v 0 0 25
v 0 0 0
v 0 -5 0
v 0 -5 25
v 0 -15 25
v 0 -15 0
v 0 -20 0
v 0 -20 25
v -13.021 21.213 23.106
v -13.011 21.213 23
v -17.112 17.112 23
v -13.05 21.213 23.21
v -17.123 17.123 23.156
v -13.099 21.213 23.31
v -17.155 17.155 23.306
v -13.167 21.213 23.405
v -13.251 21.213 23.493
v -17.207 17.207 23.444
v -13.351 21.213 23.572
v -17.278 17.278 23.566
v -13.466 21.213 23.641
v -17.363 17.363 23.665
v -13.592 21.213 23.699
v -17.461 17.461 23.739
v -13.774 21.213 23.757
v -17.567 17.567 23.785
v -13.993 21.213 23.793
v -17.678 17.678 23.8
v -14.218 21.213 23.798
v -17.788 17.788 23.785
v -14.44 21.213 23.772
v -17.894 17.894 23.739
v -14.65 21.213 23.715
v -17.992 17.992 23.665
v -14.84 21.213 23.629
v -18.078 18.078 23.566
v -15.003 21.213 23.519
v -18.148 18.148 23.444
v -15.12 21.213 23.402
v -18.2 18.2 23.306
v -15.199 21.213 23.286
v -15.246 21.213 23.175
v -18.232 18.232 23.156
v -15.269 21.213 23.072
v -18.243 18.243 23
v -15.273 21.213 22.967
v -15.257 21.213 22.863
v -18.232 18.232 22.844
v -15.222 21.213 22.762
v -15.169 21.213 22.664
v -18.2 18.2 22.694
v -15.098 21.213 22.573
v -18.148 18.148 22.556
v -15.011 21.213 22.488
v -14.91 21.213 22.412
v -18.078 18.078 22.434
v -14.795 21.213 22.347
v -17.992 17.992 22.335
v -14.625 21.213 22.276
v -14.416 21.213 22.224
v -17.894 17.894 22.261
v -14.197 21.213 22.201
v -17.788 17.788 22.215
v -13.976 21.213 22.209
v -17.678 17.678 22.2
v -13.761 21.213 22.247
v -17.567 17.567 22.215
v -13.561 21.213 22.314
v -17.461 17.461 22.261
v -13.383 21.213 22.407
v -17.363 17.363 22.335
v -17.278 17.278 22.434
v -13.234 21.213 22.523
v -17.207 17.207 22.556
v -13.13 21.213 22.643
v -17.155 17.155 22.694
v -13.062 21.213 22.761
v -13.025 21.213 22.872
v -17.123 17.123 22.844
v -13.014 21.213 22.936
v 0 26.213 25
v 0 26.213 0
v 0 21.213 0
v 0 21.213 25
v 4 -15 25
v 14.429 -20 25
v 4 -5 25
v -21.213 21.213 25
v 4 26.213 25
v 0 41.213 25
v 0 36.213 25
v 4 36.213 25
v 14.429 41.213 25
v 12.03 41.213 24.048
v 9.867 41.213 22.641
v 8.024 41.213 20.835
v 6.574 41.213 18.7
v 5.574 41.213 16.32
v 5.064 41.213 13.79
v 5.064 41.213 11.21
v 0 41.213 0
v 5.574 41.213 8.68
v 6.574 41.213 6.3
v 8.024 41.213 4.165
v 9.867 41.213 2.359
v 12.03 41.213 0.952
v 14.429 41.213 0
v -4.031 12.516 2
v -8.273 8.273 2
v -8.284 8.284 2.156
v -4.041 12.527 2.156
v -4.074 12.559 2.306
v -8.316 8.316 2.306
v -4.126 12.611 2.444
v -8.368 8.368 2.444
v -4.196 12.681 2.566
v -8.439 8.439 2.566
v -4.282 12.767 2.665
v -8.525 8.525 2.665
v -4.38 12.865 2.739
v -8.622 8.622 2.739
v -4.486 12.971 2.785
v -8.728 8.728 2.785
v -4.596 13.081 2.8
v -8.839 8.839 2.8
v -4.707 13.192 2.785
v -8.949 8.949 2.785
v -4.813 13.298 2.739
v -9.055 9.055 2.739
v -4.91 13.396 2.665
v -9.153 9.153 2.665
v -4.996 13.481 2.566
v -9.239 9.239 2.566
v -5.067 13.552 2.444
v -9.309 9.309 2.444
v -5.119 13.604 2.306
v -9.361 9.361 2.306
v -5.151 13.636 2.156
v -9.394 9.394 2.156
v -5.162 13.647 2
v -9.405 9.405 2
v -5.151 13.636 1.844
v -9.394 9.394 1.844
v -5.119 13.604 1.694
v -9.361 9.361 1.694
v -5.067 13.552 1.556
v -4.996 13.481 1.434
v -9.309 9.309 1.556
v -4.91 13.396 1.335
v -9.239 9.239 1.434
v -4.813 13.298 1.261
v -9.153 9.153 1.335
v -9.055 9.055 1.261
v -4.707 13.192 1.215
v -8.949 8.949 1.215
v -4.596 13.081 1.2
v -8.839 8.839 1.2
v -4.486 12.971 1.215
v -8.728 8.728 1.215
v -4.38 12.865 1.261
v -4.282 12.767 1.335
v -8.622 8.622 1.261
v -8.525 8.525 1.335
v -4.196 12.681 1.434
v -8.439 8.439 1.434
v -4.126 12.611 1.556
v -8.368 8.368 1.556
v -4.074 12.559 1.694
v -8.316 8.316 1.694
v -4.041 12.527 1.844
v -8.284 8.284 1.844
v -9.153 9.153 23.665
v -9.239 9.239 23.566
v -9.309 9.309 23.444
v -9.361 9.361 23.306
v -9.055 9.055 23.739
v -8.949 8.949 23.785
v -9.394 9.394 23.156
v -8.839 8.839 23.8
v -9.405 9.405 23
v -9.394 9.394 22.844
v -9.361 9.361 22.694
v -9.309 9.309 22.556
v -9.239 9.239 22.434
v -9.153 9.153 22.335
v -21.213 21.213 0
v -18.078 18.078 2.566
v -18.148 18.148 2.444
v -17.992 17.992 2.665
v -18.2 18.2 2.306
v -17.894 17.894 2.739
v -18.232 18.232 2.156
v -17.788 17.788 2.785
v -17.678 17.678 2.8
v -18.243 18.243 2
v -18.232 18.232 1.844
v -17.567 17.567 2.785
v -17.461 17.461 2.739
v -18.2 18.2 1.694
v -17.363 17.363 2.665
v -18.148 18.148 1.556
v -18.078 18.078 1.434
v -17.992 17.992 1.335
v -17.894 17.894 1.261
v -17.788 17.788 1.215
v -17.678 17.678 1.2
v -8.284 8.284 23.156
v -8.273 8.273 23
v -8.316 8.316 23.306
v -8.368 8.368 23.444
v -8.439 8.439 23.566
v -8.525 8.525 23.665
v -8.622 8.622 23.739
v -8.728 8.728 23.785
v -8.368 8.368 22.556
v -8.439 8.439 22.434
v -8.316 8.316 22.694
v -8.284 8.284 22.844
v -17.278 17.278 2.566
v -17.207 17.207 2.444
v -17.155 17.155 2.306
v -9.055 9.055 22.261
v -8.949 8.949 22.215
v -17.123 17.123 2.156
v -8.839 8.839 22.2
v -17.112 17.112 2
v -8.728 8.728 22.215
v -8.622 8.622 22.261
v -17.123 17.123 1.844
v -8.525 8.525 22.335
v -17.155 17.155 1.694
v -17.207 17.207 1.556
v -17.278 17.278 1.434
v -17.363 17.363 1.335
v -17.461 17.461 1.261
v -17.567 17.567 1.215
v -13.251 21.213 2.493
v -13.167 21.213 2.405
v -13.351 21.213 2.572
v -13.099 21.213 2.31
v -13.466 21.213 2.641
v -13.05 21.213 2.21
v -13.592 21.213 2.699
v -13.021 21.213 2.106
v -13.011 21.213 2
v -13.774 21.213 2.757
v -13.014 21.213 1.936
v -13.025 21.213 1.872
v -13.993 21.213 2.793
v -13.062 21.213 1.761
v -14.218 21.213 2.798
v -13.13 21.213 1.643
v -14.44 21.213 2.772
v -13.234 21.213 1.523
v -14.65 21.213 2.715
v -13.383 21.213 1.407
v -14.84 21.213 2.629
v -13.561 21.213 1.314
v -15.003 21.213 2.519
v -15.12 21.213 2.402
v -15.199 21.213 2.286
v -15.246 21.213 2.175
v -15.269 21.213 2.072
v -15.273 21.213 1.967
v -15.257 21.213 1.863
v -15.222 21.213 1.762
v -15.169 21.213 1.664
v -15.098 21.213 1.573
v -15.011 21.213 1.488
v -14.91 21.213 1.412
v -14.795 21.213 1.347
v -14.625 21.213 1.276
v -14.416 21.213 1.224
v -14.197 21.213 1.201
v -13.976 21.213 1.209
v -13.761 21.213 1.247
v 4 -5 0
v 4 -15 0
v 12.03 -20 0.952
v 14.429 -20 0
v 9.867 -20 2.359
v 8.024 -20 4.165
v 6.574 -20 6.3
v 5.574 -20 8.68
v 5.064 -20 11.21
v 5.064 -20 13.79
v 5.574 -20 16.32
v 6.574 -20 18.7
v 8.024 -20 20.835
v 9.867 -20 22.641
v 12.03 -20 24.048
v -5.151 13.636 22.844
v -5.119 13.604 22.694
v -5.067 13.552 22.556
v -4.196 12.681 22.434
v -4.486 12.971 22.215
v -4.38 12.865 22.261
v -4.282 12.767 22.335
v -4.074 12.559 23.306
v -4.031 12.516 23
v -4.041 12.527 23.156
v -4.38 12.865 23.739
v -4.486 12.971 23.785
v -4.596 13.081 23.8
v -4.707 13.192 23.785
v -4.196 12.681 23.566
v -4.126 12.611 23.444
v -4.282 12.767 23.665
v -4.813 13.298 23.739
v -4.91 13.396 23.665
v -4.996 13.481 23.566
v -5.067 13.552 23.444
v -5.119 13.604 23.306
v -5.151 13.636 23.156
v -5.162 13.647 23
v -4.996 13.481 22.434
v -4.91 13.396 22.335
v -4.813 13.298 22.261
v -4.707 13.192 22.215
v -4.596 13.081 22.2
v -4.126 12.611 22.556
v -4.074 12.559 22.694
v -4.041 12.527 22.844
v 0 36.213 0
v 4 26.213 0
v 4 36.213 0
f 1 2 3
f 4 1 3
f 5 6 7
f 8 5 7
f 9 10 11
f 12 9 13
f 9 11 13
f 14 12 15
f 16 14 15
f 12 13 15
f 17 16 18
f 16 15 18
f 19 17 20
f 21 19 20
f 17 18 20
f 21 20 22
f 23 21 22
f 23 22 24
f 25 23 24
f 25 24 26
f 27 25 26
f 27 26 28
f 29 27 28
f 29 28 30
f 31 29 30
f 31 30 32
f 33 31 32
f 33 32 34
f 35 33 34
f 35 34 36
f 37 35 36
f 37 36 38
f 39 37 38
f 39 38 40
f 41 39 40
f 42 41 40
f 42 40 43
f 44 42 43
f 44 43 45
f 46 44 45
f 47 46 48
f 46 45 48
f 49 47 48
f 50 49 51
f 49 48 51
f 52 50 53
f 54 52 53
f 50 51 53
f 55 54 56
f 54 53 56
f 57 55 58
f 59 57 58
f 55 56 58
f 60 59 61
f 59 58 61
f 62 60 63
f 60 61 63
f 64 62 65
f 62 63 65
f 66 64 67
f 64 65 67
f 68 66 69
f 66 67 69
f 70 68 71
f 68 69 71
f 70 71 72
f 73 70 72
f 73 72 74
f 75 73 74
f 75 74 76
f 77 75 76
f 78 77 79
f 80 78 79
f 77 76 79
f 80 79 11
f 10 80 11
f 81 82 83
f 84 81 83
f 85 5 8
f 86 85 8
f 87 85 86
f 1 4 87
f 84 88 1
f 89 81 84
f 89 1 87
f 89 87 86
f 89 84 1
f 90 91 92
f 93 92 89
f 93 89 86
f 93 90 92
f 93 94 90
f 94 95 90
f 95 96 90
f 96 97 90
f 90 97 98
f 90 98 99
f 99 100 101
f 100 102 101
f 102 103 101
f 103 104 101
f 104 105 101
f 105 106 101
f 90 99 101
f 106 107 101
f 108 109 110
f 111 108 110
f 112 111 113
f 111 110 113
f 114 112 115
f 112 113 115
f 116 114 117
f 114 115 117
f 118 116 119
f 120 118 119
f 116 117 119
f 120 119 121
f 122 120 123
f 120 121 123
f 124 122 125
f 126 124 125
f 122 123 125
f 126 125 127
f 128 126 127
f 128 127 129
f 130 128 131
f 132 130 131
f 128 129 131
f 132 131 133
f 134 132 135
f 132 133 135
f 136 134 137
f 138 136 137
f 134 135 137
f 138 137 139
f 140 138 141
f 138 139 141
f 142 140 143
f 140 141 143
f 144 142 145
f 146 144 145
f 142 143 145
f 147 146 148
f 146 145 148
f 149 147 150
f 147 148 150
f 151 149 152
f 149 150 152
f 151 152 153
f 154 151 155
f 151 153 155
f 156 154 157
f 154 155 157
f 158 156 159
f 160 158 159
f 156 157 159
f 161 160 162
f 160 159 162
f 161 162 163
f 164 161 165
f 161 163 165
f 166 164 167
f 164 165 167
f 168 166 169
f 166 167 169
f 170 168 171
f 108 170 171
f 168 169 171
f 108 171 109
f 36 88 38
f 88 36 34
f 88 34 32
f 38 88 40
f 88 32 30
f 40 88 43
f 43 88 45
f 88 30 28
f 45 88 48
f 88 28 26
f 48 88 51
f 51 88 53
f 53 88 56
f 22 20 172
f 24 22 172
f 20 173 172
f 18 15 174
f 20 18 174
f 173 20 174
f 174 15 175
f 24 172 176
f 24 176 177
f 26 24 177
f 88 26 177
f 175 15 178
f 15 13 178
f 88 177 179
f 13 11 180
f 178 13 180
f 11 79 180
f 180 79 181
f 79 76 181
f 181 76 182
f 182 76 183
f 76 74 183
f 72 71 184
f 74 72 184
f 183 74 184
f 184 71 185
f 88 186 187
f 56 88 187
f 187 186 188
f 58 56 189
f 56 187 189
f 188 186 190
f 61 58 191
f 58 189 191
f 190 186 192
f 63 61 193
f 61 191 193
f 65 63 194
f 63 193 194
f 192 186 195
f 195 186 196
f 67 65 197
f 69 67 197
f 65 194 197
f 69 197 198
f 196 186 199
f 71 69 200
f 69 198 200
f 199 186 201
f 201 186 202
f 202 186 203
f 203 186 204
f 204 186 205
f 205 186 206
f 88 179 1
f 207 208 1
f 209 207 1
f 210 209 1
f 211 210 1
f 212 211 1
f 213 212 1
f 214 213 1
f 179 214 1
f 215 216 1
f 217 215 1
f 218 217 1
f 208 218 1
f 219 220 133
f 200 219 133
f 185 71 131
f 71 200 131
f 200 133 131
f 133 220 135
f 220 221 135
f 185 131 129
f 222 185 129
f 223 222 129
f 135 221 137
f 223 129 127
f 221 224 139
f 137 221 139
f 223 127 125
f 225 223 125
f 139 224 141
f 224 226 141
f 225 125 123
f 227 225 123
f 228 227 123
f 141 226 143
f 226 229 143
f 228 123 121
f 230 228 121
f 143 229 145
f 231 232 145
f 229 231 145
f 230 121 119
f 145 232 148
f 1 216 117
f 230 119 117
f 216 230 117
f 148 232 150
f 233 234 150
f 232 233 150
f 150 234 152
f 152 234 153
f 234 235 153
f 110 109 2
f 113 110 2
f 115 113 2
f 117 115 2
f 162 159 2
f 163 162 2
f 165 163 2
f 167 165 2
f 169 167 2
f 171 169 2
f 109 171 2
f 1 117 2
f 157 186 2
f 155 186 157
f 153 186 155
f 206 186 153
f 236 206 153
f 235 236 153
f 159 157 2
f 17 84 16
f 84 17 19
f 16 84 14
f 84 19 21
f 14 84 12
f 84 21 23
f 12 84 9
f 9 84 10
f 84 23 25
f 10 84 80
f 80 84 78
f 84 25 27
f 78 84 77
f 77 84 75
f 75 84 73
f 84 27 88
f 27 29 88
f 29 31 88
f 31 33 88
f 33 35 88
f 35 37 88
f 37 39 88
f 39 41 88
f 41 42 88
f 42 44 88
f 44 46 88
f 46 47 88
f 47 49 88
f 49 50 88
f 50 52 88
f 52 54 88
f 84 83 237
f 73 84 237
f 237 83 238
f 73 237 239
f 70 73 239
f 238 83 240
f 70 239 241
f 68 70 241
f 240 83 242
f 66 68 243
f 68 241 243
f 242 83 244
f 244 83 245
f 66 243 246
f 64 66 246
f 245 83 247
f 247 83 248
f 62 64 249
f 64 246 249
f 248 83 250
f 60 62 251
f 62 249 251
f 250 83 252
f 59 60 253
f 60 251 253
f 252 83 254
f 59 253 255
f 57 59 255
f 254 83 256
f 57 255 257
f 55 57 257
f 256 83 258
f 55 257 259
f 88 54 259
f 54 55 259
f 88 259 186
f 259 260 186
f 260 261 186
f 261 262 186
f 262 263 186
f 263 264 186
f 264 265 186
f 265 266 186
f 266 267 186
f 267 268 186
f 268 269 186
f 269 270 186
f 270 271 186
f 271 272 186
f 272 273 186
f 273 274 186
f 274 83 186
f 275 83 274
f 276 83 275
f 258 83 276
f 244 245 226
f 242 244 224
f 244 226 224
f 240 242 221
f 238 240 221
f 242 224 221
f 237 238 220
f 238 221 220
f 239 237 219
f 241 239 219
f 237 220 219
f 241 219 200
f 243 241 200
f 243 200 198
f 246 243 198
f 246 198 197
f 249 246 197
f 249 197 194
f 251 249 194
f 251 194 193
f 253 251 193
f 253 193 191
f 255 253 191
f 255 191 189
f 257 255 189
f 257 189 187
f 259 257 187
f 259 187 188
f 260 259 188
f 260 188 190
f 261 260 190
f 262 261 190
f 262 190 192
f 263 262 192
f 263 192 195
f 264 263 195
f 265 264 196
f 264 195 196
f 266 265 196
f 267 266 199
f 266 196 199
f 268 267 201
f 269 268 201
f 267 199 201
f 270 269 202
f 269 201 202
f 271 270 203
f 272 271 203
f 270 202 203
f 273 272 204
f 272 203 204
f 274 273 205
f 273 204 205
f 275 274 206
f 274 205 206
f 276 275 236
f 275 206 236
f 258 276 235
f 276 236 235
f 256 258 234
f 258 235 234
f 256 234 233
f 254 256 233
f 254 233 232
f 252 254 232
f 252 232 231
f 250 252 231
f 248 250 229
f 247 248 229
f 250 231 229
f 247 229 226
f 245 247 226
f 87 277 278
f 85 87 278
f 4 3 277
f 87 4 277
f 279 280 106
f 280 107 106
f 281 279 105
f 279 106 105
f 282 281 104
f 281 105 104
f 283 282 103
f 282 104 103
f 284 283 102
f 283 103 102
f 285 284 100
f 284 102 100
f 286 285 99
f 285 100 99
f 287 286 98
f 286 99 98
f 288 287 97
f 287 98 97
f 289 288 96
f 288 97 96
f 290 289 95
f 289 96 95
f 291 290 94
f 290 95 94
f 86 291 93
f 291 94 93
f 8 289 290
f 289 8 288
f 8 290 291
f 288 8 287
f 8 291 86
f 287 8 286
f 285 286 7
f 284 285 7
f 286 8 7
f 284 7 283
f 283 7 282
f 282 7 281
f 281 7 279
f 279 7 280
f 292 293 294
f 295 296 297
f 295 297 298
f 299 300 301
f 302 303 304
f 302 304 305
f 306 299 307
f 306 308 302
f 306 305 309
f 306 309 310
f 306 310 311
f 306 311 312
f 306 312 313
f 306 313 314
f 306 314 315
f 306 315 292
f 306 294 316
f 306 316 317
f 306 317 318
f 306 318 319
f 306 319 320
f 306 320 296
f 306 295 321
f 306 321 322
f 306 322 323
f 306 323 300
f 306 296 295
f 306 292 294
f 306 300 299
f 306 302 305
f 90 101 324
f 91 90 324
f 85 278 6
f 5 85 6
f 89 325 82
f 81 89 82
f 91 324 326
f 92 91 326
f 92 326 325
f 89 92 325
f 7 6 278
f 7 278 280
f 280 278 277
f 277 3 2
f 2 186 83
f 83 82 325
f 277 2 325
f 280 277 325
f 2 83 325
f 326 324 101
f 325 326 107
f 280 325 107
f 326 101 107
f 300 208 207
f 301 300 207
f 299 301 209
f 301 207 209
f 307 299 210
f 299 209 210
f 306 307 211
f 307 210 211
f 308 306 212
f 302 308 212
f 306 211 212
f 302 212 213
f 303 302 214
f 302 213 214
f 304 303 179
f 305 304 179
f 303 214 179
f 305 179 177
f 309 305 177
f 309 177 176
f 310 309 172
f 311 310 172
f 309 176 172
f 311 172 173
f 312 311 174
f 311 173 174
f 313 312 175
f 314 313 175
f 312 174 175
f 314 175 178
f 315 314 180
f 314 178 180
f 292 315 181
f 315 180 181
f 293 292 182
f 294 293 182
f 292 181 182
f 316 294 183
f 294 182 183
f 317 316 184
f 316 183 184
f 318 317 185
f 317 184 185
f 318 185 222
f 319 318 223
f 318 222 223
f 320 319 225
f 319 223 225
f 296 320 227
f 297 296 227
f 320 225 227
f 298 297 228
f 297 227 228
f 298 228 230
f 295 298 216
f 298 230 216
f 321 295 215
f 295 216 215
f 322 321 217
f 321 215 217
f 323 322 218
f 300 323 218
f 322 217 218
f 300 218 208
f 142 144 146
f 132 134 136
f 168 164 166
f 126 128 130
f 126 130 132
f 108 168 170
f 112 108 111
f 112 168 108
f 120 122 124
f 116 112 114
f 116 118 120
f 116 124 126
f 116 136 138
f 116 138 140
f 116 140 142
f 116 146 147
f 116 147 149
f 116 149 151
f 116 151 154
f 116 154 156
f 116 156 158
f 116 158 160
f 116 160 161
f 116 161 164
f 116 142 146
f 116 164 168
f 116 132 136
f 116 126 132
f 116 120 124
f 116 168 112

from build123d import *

# Parameters (mm, degrees)
PAD_DEPTH       = 25
SKETCH001_R     = 13
POCKET_DEPTH    = 61.214203
SKETCH002_R     = 0.8
POCKET001_DEPTH = 6


with BuildPart() as part:
    # Sketch → Pad (new body)
    with BuildSketch(Plane.XY):
        Polygon((0, 21.213203), (-21.213203, 21.213203), (0, 0), (0, -5), (4, -5), (4, -15), (0, -15), (0, -20), (20, -20), (20, 41.213203), (0, 41.213203), (0, 36.213203), (4, 36.213203), (4, 26.213203), (0, 26.213203), align=None)
    extrude(amount=PAD_DEPTH)

    # Sketch001 (on Face1 of Pad) → Pocket (cut, through all)
    with BuildSketch(Plane(origin=(0, 41.213203, 0), x_dir=(-1, 0, 0), z_dir=(0, 1, 0))):
        with Locations((-18, 12.5)):
            Circle(SKETCH001_R)
    extrude(amount=-POCKET_DEPTH, mode=Mode.SUBTRACT)

    # Sketch002 (on Face13 of Pocket) → Pocket001 (cut)
    with BuildSketch(Plane(origin=(0, 0, 0), x_dir=(0.707107, -0.707107, 0), z_dir=(-0.707107, -0.707107, 0))):
        with Locations((-25, 23)):
            Circle(SKETCH002_R)
        with Locations((-25, 2)):
            Circle(SKETCH002_R)
        with Locations((-12.5, 23)):
            Circle(SKETCH002_R)
        with Locations((-12.5, 2)):
            Circle(SKETCH002_R)
    extrude(amount=-POCKET001_DEPTH, mode=Mode.SUBTRACT)


solid = part.part
